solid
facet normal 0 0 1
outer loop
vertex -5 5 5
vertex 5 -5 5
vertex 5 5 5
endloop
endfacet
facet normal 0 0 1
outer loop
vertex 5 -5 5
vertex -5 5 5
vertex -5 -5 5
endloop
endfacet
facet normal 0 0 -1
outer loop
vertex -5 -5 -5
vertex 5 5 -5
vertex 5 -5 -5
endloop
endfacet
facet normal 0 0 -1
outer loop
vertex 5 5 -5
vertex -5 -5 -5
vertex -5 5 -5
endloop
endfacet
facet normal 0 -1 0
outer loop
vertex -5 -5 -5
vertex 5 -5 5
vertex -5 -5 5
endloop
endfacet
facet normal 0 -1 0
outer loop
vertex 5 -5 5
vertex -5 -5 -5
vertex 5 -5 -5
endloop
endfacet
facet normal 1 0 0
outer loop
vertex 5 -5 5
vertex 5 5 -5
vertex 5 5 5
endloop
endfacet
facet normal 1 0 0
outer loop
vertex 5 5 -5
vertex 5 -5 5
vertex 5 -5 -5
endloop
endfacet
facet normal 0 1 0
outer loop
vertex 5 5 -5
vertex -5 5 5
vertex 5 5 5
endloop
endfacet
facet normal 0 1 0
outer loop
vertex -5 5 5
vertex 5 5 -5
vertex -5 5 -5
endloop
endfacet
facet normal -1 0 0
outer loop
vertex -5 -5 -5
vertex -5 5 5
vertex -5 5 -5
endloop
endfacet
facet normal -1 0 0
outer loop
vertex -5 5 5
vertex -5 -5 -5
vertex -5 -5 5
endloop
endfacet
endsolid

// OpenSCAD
// Simple fixture model for integration tests
cube([10, 10, 10], center=true);
